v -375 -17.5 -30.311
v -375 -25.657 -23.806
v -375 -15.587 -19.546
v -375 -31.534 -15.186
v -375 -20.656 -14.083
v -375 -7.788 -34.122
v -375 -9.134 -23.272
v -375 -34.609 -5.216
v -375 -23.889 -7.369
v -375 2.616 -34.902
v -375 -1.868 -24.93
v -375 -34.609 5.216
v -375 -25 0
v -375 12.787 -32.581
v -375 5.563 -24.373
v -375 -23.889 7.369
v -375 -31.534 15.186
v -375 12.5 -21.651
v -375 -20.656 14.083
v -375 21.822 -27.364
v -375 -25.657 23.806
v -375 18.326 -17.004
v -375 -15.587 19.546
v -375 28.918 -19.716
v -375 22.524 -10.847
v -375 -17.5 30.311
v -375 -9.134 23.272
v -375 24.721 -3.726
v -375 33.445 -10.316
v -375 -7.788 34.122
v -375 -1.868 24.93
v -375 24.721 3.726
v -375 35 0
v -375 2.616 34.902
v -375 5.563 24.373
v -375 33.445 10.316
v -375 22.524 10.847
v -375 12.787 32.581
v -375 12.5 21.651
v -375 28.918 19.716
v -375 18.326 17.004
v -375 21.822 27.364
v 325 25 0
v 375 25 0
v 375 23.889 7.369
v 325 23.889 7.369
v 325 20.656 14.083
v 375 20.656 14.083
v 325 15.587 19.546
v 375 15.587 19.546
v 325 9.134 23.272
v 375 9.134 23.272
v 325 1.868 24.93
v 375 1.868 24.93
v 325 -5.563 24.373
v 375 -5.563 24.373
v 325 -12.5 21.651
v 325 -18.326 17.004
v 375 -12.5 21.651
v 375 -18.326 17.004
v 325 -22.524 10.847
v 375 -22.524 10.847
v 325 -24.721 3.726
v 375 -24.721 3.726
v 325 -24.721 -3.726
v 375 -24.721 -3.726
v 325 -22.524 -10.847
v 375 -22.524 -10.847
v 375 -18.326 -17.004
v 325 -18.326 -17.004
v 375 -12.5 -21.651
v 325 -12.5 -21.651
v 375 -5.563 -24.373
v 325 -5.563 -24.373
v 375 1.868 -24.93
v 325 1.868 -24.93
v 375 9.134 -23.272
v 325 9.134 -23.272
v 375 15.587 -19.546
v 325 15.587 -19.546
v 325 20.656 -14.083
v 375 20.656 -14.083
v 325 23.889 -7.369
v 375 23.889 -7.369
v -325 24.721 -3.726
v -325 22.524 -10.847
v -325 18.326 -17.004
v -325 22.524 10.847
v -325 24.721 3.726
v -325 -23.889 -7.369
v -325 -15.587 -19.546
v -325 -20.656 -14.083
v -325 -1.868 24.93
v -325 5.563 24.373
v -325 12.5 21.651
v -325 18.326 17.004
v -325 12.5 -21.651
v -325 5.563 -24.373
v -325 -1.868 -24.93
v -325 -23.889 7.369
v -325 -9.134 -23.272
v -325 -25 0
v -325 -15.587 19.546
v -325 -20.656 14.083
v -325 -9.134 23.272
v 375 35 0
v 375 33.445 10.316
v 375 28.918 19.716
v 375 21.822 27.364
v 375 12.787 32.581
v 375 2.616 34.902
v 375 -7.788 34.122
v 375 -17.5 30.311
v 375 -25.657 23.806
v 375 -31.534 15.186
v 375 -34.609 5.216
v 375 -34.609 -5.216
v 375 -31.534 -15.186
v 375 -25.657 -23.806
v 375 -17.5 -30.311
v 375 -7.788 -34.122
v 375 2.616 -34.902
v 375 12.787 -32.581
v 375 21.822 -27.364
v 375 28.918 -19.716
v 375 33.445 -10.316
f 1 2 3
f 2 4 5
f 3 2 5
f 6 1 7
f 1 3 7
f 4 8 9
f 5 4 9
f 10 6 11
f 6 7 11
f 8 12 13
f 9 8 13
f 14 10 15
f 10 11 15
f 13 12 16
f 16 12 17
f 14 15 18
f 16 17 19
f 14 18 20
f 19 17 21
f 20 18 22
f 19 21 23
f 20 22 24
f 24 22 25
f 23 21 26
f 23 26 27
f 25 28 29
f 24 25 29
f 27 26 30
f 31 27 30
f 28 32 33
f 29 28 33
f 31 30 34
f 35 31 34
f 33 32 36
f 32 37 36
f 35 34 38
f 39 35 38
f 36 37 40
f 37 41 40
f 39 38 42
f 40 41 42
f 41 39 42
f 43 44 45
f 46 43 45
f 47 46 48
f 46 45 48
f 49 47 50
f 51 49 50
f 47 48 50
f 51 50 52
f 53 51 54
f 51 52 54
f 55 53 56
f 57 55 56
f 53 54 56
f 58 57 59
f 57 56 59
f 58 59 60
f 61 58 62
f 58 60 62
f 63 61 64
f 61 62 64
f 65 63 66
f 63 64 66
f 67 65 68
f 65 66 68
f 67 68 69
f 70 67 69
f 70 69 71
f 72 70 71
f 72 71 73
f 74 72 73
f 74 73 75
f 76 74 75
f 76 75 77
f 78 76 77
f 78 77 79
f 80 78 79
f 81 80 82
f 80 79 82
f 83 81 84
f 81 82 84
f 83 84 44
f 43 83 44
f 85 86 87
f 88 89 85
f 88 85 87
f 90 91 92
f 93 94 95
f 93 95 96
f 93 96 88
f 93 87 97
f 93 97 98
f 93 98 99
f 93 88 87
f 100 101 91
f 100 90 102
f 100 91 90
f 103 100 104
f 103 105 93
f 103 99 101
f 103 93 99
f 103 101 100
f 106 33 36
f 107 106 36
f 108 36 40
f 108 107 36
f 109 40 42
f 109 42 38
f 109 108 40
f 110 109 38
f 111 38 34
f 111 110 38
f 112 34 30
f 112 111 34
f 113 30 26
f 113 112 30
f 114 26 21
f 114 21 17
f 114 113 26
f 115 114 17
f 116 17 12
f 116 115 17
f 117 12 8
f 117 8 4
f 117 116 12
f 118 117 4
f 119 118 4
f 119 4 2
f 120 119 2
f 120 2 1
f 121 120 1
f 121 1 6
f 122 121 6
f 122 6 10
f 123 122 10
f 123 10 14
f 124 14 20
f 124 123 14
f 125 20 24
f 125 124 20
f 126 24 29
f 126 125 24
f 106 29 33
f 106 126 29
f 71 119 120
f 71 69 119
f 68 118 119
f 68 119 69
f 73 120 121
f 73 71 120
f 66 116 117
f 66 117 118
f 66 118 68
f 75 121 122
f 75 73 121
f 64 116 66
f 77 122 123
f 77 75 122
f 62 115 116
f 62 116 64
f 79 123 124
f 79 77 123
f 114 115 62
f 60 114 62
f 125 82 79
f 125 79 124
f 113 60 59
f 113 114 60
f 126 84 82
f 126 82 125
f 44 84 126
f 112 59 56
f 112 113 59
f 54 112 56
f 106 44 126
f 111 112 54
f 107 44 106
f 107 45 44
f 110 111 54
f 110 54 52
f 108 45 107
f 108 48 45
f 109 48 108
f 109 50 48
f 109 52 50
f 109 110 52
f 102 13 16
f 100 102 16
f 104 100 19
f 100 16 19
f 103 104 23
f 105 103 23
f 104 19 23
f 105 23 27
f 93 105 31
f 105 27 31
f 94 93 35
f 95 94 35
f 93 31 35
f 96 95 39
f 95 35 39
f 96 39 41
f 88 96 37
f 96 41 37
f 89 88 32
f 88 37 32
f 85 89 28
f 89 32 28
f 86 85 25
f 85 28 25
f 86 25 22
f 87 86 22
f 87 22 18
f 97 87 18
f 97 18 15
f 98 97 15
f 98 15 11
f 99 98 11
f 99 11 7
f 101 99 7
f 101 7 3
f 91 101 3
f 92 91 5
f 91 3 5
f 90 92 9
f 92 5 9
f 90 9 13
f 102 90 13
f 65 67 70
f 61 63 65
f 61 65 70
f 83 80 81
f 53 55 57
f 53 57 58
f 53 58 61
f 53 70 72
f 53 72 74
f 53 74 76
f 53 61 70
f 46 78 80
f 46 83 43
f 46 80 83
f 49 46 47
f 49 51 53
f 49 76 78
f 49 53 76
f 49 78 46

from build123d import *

# Parameters (mm, degrees)
F0_R     = 35
F1_DEPTH = 375
F2_R     = 25
F3_DEPTH = 50
F4_R     = 25
F5_DEPTH = 50


with BuildPart() as f1:
    # F0 (on Right) → F1 (new body, symmetric)
    with BuildSketch(Plane.YZ):
        Circle(F0_R)
    extrude(amount=F1_DEPTH, both=True)

    # F2 (on face) → F3 (cut)
    with BuildSketch(Plane(origin=(-375, 0, 0), x_dir=(0, -1, 0), z_dir=(-1, 0, 0))):
        Circle(F2_R)
    extrude(amount=-F3_DEPTH, mode=Mode.SUBTRACT)

    # F4 (on face) → F5 (cut)
    with BuildSketch(Plane.YZ.offset(375)):
        Circle(F4_R)
    extrude(amount=-F5_DEPTH, mode=Mode.SUBTRACT)


solid = f1.part
